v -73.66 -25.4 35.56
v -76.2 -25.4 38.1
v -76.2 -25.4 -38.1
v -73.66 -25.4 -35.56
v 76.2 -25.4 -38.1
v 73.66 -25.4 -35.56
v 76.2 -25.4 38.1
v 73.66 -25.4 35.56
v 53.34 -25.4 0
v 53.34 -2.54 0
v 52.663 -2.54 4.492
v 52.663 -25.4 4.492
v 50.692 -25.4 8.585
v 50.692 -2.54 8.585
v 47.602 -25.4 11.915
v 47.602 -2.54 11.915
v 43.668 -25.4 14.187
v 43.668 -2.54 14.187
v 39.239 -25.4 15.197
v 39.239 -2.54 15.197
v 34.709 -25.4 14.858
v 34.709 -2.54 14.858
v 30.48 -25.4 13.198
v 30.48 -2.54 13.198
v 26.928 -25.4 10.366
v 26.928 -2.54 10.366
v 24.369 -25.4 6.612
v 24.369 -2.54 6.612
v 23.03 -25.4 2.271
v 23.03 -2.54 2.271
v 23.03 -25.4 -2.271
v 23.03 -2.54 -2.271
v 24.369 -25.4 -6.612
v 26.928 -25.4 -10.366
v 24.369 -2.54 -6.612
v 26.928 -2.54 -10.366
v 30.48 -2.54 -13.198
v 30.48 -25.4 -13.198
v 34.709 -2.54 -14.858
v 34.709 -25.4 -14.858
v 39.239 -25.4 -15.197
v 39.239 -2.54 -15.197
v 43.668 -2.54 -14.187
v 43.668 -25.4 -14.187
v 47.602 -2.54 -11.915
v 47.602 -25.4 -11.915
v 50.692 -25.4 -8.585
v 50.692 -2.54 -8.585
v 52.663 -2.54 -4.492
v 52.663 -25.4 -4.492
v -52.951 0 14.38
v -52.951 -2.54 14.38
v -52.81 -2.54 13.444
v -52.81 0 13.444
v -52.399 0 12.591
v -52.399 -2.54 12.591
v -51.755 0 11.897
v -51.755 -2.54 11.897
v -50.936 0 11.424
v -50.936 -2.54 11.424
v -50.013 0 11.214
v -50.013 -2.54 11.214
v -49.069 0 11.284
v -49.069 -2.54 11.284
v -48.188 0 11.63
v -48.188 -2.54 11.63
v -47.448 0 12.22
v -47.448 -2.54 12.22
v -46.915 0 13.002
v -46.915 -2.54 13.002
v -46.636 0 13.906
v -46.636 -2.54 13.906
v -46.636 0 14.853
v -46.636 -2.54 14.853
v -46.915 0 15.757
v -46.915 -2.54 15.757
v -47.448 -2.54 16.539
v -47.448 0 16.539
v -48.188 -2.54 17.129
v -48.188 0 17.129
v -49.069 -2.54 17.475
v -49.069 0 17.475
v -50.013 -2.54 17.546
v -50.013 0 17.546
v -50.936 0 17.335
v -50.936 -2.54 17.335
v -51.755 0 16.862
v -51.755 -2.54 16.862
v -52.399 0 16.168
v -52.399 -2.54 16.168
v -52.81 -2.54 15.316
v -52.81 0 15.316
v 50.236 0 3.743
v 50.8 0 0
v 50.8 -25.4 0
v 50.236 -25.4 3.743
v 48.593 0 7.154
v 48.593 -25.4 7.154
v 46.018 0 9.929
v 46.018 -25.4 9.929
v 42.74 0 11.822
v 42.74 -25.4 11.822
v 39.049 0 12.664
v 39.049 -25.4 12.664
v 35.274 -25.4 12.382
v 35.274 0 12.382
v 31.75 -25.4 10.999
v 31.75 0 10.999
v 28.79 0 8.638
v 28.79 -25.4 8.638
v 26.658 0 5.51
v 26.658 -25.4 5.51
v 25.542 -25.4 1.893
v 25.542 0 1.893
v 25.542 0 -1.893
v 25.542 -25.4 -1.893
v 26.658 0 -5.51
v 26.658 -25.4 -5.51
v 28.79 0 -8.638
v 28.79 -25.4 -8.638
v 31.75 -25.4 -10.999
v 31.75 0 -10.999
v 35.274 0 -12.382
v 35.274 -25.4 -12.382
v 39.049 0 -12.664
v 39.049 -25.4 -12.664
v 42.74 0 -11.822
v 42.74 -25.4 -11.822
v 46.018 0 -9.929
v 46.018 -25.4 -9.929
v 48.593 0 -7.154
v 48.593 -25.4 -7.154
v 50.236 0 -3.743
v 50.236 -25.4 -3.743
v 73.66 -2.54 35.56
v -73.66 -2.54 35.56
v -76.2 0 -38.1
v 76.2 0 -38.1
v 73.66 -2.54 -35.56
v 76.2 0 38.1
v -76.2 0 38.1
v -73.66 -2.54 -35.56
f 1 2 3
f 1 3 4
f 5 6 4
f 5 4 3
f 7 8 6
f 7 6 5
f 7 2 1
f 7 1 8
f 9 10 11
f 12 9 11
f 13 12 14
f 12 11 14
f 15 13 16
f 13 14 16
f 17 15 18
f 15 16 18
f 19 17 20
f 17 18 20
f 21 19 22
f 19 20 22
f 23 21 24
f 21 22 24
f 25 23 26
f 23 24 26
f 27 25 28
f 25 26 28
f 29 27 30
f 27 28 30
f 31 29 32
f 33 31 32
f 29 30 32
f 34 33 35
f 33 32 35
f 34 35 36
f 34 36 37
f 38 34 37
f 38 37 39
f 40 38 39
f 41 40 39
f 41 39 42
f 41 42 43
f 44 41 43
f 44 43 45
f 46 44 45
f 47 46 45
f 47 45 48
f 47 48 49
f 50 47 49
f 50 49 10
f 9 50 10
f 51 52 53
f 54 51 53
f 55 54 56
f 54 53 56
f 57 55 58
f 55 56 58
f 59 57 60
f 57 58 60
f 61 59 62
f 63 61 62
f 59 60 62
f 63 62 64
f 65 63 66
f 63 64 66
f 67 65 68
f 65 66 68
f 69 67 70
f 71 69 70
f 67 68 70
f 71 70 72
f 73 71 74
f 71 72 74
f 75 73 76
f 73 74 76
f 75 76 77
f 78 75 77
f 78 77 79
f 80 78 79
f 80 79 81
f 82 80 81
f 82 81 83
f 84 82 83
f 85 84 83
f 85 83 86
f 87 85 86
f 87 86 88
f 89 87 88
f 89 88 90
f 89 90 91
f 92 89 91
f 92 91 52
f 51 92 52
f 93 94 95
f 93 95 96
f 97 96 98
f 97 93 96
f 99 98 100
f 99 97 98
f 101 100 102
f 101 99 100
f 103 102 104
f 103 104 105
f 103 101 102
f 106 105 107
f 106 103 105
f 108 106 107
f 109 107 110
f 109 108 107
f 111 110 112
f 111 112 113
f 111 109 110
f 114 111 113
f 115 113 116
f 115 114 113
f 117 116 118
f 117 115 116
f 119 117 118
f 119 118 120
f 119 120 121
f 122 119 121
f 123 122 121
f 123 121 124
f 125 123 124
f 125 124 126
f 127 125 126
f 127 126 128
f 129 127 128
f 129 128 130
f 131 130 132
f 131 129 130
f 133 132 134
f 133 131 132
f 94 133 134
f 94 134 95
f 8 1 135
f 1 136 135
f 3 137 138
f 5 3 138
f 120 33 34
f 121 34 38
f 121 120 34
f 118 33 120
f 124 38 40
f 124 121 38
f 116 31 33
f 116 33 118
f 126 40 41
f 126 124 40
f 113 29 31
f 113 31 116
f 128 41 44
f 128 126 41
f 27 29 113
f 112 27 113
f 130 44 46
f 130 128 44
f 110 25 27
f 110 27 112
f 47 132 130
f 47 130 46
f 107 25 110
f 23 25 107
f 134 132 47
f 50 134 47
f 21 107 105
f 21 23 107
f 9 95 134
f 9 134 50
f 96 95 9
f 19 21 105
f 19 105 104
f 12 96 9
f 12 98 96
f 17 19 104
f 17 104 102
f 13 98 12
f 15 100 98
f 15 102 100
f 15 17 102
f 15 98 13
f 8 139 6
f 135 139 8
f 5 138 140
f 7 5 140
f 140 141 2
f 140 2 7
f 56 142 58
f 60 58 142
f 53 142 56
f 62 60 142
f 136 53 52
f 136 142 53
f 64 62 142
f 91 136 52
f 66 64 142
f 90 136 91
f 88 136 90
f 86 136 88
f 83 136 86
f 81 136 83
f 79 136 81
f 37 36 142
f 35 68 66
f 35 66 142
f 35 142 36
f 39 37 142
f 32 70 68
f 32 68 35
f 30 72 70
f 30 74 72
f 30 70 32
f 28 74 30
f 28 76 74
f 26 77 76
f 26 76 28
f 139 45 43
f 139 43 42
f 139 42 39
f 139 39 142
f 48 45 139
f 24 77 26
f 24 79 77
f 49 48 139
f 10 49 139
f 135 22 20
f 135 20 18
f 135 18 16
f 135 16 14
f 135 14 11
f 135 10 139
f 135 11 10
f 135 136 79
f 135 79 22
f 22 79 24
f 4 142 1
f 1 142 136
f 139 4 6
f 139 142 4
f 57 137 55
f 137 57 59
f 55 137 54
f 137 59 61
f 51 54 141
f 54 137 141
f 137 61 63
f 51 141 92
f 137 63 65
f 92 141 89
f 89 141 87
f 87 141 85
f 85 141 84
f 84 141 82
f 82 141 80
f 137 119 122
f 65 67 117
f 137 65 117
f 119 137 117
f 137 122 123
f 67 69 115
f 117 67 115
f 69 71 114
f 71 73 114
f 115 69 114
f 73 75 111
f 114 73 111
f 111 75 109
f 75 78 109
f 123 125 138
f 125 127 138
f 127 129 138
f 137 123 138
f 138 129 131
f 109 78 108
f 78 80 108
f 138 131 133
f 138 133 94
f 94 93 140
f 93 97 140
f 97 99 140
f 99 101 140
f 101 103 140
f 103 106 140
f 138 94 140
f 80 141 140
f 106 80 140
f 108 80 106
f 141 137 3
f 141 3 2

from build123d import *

# Parameters (mm, degrees)
F0_W     = 152.4
F0_H     = 76.2
F0_R     = 12.7
F1_DEPTH = 25.4
F2_T     = -2.54
F4_D     = 6.35


with BuildPart() as f1:
    # F0 (on Front) → F1 (new body)
    with BuildSketch(Plane.XZ):
        Rectangle(F0_W, F0_H)
        with Locations((38.1, 0)):
            Circle(F0_R, mode=Mode.SUBTRACT)
    extrude(amount=F1_DEPTH)

    # F2
    f2_openings = [f1.faces().sort_by_distance(p)[0] for p in [
        (-1.738273, -25.4, 0),
    ]]
    offset(amount=F2_T, openings=f2_openings)

    # F4 (through all)
    with Locations(Plane(origin=(0, 0, 0), x_dir=(1, 0, 0), z_dir=(0, 1, 0))):
        with Locations((-49.7758053243, -14.3796773627)):
            Hole(F4_D / 2)


solid = f1.part
